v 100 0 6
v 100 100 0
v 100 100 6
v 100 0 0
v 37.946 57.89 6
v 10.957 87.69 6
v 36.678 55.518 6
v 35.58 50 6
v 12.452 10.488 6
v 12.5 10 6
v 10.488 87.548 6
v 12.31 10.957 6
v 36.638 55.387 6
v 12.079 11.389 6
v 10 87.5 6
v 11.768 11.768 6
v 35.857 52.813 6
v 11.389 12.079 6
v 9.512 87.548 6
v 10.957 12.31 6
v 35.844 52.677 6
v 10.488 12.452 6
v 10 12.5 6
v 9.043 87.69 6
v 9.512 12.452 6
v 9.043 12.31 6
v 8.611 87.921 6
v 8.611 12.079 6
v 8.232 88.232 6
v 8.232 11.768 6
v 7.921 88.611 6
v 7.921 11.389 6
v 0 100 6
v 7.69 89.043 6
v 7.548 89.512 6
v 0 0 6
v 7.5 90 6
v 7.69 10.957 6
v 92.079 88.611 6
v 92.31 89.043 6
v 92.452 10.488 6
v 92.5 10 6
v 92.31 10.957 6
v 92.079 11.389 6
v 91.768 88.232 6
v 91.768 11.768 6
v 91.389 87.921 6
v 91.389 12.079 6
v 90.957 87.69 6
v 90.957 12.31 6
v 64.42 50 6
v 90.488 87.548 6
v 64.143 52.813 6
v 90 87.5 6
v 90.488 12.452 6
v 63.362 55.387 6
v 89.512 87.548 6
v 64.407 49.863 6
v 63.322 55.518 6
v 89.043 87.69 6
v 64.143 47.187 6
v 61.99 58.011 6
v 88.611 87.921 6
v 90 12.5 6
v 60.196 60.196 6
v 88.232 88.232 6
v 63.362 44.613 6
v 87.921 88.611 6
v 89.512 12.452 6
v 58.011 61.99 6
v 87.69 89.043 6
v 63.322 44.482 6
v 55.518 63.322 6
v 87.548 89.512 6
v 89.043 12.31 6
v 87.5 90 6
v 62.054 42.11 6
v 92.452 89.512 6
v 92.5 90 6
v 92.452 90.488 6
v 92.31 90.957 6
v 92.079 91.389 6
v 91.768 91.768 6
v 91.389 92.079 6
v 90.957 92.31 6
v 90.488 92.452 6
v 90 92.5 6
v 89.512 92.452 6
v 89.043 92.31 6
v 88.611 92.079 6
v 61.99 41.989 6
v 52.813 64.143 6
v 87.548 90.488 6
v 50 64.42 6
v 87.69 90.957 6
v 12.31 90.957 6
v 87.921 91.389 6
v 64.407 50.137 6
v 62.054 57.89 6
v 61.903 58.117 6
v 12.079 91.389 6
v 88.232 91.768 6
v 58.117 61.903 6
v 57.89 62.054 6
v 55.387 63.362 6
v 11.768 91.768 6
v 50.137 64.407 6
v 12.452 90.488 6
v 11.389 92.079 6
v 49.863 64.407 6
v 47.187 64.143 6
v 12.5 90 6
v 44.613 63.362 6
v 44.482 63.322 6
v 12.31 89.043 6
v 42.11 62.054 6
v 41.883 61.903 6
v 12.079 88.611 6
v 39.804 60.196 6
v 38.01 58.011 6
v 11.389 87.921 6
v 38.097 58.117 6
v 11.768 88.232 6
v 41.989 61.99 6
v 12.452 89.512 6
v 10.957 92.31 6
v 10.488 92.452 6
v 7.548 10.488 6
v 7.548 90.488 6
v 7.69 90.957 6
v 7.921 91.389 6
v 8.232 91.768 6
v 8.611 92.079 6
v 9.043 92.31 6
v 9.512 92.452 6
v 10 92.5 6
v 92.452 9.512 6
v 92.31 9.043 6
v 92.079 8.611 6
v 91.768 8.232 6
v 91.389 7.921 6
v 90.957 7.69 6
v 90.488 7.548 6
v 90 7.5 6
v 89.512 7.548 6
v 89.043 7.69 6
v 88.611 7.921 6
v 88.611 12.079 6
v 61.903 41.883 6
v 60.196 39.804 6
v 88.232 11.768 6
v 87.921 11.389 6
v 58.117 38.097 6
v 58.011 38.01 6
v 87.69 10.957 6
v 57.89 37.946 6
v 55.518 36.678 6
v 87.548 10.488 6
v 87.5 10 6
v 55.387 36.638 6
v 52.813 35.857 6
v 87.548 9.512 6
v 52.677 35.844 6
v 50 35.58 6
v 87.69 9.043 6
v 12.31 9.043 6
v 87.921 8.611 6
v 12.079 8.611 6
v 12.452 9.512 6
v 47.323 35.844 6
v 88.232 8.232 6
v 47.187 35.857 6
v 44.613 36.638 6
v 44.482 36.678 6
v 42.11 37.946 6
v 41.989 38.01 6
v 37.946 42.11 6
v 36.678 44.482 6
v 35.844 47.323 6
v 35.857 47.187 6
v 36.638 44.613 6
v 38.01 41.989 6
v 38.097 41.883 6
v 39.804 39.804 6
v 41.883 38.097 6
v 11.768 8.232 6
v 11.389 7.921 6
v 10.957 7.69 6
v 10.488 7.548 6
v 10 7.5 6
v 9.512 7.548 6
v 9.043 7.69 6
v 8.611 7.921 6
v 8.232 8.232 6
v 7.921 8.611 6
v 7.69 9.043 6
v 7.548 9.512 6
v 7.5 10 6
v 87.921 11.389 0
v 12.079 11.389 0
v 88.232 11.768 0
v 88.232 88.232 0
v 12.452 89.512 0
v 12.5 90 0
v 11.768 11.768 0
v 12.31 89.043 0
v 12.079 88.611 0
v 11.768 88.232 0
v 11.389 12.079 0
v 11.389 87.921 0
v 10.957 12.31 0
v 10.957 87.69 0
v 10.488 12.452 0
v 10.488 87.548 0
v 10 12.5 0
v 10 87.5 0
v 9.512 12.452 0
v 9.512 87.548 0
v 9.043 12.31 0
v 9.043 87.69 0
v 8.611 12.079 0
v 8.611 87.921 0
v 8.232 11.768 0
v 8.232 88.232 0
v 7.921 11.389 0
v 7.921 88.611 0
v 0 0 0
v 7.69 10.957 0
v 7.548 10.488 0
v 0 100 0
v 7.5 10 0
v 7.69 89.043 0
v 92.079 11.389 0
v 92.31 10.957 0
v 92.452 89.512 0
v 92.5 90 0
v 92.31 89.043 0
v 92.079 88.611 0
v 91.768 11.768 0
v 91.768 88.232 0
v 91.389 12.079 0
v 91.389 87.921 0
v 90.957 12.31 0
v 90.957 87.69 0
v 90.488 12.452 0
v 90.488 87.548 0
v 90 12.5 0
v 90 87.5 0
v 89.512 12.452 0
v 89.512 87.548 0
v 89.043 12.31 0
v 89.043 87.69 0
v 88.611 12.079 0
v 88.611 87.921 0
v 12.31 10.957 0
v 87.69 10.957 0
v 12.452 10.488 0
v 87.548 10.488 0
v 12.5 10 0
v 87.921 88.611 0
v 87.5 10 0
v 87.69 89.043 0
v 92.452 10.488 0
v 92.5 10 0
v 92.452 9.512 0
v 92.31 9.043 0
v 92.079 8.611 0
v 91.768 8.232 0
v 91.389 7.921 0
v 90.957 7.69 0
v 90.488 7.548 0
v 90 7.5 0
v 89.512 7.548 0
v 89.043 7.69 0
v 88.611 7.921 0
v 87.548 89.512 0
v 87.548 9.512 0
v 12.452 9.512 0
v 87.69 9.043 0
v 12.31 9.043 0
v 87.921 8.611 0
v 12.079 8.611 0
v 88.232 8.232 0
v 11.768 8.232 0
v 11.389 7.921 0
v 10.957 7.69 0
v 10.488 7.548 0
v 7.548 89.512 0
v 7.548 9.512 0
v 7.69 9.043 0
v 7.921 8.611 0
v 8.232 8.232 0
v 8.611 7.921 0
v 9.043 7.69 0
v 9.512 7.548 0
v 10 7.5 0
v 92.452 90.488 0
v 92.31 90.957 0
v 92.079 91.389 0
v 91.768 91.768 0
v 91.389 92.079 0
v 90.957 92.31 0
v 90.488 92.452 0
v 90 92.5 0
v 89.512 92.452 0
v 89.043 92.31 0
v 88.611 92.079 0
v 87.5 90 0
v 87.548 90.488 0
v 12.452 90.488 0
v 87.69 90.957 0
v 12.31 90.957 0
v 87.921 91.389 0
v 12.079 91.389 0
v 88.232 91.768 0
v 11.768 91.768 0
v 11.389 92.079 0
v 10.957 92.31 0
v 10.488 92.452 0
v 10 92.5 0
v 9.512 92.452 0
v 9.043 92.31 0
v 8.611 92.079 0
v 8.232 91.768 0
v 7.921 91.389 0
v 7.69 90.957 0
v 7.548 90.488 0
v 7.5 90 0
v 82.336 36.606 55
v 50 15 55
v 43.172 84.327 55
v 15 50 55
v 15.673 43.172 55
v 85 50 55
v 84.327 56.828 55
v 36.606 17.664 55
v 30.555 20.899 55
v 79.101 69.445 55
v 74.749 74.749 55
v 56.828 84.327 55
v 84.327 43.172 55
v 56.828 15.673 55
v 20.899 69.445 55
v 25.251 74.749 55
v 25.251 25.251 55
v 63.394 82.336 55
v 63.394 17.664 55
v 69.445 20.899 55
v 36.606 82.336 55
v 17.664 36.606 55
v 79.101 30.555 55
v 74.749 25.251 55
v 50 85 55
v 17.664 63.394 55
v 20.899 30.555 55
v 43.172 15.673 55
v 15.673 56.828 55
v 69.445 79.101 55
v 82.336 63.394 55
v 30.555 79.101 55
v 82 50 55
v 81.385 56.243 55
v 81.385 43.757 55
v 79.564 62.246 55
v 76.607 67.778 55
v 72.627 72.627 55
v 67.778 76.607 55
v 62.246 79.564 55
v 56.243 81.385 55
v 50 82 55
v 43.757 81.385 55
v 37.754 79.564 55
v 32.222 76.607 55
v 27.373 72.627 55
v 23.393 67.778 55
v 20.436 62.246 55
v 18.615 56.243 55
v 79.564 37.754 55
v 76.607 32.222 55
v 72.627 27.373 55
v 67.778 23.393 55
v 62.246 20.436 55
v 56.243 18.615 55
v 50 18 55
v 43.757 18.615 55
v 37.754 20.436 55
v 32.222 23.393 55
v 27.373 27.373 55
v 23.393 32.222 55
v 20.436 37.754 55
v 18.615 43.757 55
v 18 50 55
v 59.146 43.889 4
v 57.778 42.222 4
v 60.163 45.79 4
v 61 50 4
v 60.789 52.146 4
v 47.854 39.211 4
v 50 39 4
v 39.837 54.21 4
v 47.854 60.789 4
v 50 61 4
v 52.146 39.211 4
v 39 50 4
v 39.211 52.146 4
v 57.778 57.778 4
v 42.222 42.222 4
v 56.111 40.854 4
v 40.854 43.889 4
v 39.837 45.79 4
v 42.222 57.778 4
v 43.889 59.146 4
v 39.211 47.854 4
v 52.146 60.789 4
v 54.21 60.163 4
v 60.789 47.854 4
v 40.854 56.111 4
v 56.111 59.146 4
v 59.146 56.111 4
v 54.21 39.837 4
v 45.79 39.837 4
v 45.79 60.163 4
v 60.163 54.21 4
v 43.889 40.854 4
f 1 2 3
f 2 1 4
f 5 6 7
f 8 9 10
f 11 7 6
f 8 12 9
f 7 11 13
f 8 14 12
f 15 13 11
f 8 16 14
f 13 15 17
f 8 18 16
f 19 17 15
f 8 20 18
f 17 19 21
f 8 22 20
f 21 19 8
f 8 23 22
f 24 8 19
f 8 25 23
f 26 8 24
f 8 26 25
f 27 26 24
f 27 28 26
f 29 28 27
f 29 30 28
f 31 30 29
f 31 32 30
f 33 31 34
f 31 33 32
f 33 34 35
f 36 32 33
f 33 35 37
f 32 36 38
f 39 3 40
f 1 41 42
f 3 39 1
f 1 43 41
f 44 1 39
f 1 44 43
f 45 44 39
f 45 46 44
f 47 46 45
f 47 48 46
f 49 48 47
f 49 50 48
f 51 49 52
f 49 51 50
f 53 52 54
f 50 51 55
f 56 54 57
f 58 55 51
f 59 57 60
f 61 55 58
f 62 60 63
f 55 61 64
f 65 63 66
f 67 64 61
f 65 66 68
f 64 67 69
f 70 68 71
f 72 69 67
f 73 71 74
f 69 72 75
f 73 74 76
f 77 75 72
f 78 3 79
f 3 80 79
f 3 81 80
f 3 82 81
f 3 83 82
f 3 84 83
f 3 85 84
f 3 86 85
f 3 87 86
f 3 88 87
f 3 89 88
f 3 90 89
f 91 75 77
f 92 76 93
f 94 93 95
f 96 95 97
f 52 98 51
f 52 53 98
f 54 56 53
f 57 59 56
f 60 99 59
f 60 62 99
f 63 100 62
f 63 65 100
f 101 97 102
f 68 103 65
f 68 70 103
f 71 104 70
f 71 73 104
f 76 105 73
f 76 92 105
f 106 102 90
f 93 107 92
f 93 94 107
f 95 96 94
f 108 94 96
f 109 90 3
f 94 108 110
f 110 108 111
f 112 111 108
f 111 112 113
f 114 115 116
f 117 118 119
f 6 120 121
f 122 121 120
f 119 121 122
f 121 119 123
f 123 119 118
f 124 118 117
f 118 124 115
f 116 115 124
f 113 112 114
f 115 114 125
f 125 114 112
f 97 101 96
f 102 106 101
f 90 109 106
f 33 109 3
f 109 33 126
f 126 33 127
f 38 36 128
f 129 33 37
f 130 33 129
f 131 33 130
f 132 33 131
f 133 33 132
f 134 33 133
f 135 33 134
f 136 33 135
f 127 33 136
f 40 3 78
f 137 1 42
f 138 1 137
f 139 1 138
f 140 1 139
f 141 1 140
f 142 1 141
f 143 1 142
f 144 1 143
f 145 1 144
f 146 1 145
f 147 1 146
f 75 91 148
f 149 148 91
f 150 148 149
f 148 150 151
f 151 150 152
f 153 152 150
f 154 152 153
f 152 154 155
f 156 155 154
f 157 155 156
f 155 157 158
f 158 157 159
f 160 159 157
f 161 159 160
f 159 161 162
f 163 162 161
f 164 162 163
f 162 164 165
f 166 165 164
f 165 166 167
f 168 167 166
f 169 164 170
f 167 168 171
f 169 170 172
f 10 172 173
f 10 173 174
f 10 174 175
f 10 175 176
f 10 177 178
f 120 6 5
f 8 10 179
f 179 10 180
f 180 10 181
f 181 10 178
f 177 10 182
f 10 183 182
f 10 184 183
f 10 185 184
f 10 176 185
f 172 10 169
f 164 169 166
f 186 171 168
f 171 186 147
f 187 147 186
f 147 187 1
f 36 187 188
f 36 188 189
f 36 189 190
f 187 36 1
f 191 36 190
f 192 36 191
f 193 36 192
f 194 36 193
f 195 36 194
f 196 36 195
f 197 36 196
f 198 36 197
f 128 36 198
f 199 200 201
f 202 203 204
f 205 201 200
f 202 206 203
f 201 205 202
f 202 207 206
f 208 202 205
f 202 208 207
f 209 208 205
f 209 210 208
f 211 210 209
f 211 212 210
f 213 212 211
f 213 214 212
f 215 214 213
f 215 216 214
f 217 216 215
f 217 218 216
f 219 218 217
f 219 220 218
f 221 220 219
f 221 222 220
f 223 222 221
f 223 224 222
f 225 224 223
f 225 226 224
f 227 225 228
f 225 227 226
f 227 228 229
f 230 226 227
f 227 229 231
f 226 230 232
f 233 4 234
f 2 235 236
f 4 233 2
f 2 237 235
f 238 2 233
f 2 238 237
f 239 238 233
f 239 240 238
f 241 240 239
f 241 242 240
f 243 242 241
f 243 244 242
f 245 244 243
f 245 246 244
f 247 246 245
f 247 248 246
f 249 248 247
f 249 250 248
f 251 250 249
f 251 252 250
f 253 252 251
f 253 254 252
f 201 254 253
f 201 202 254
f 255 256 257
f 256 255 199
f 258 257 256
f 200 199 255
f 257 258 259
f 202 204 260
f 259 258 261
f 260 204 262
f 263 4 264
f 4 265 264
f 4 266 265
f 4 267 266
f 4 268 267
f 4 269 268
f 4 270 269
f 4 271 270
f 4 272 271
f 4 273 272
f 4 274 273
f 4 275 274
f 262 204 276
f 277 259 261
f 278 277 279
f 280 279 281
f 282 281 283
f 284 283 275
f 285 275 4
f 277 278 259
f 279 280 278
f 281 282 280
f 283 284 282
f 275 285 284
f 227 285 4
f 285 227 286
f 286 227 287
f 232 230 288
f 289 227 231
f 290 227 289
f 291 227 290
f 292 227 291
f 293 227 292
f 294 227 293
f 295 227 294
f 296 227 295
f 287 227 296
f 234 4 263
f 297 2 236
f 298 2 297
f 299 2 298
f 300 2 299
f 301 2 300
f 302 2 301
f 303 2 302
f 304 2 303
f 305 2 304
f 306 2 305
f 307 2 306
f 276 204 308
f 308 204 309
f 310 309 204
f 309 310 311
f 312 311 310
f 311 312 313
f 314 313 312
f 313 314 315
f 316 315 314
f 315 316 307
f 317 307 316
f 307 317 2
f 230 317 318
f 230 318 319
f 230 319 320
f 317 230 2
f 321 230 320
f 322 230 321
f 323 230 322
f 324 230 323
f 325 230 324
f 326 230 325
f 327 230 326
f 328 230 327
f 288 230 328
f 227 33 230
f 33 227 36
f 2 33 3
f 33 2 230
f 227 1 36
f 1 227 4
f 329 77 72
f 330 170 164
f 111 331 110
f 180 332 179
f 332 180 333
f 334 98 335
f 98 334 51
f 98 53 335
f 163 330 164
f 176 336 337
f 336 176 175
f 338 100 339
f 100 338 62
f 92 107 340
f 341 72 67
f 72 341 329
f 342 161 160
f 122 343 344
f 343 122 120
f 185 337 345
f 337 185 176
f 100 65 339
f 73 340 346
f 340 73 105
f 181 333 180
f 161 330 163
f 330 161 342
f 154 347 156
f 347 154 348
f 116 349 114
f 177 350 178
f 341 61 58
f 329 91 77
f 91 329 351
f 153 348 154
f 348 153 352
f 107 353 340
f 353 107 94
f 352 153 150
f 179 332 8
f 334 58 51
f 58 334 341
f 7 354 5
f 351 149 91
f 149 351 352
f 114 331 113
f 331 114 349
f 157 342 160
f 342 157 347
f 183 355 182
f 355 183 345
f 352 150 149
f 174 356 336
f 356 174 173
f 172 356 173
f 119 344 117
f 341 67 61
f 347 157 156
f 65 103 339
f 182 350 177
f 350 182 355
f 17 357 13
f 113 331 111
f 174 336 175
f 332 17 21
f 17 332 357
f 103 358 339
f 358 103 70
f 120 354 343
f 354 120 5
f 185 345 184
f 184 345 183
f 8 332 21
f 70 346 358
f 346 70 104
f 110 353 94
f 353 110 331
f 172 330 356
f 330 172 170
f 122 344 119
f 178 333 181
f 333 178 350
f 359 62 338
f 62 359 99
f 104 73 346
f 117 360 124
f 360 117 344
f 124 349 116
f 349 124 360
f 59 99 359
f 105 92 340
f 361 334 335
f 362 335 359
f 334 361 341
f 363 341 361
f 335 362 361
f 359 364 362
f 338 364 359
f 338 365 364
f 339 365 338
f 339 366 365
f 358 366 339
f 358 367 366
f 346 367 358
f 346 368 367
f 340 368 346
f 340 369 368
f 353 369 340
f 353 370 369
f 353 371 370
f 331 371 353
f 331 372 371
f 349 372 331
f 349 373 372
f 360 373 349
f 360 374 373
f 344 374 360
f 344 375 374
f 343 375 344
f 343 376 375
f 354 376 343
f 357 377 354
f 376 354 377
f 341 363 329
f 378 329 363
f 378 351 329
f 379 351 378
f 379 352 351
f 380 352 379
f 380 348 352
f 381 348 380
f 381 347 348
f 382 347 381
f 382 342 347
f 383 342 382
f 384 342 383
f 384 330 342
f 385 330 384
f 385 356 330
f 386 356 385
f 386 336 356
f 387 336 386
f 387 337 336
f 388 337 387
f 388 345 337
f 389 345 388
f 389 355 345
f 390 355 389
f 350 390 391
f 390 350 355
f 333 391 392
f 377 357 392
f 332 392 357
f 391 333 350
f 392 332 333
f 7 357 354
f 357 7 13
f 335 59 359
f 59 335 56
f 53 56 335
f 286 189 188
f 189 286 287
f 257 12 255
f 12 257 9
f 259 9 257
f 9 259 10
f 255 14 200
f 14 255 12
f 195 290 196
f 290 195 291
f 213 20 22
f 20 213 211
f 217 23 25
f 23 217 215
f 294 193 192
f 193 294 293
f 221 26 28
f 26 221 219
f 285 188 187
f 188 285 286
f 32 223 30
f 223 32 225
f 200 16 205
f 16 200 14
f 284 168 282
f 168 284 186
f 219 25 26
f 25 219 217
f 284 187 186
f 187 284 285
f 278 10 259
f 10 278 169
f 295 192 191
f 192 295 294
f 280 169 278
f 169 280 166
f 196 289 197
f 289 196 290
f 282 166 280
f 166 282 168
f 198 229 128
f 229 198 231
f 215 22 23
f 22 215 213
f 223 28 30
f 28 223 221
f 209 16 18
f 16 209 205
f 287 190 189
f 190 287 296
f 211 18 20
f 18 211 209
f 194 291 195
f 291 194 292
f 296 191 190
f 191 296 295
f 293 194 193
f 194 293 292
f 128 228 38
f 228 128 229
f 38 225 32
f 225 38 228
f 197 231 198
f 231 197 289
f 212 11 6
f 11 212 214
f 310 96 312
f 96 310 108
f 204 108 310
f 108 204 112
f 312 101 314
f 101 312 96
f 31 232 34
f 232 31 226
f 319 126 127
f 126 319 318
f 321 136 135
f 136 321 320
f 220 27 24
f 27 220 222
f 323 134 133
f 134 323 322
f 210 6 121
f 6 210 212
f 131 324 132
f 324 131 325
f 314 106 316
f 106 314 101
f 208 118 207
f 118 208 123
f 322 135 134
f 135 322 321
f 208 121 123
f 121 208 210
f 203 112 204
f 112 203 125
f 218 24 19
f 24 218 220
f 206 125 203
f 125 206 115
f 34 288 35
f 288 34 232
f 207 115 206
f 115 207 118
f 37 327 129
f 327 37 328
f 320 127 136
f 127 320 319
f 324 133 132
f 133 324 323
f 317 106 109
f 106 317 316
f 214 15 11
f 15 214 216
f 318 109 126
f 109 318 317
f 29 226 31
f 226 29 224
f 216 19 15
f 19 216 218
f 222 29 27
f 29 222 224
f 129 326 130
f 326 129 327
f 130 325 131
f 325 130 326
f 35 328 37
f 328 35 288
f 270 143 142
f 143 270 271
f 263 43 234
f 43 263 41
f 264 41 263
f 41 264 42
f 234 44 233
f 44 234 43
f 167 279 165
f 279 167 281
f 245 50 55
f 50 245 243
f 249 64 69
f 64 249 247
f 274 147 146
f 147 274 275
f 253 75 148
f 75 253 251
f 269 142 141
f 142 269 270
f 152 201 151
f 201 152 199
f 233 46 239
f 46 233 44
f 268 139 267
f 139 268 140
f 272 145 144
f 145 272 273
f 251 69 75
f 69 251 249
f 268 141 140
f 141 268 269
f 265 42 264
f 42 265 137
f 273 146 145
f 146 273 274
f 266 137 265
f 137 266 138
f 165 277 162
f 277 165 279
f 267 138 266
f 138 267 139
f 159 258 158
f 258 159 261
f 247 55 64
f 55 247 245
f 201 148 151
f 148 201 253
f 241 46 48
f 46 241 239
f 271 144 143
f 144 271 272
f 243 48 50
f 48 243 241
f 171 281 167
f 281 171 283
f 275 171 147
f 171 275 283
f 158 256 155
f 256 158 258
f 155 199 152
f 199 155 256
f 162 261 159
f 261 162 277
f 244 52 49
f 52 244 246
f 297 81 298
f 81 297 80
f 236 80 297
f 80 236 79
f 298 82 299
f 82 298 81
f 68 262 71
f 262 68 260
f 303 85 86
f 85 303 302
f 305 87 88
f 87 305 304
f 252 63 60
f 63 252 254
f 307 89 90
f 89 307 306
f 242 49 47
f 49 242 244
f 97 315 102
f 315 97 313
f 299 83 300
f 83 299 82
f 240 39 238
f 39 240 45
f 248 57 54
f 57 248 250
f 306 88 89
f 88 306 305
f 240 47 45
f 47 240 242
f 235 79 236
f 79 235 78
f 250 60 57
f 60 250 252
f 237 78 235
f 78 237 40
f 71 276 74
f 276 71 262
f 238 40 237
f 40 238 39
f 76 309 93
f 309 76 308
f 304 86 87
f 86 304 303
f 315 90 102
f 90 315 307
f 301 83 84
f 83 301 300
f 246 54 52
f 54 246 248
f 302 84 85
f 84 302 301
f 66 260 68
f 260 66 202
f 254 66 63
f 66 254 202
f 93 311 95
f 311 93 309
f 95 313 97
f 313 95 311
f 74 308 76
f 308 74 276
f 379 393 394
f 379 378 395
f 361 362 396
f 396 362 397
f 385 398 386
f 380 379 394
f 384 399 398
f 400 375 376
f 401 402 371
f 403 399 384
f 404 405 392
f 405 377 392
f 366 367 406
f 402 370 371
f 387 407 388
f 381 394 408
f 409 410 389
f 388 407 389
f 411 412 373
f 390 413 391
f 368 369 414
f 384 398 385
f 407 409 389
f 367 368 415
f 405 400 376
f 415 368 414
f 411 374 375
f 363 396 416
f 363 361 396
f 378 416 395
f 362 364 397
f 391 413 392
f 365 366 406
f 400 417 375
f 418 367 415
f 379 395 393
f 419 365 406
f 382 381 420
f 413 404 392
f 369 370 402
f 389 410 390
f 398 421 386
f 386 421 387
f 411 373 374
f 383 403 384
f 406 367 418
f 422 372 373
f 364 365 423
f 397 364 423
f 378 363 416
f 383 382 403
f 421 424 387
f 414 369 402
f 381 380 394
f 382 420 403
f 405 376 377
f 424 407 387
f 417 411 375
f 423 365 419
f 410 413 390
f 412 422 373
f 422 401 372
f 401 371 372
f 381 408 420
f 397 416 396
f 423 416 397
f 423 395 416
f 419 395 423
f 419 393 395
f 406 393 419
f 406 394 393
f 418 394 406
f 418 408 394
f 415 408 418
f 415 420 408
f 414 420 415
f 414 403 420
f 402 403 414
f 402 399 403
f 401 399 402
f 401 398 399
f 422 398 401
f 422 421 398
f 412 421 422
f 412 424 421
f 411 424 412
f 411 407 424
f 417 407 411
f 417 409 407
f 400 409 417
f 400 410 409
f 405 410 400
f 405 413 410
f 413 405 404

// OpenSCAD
$fn = 32;

// ----------------------------------------------------------------------
// Hopper: flanged with square flange
// ----------------------------------------------------------------------

// --- parameters (mm) ---
fl = 100;                 // flange side, X and Y
fl_t = 6;                 // flange thickness
cone_h = 50;              // cone height above the flange
top_d = 70;               // cone mouth diameter
bot_d = 28;               // cone spout diameter
wall = 3;                 // cone wall thickness
hole_r = 2.5;             // flange hole radius
hole_in = 10;             // hole inset from the corners

bore_d = bot_d - 2 * wall;  // spout bore diameter
total_h = fl_t + cone_h - 1;  // overall height

difference() {
  union() {
    cube([fl, fl, fl_t]);
    translate([fl / 2, fl / 2, fl_t - 1])
      cylinder(h = cone_h, d1 = bot_d, d2 = top_d);
  }
  translate([fl / 2, fl / 2, fl_t - 2])
    cylinder(h = cone_h + 1, d1 = bore_d, d2 = top_d - 2 * wall);
  for (sx = [0, 1], sy = [0, 1])
    translate([sx ? fl - hole_in : hole_in,
               sy ? fl - hole_in : hole_in, -1])
      cylinder(r = hole_r, h = fl_t + 2);
}
